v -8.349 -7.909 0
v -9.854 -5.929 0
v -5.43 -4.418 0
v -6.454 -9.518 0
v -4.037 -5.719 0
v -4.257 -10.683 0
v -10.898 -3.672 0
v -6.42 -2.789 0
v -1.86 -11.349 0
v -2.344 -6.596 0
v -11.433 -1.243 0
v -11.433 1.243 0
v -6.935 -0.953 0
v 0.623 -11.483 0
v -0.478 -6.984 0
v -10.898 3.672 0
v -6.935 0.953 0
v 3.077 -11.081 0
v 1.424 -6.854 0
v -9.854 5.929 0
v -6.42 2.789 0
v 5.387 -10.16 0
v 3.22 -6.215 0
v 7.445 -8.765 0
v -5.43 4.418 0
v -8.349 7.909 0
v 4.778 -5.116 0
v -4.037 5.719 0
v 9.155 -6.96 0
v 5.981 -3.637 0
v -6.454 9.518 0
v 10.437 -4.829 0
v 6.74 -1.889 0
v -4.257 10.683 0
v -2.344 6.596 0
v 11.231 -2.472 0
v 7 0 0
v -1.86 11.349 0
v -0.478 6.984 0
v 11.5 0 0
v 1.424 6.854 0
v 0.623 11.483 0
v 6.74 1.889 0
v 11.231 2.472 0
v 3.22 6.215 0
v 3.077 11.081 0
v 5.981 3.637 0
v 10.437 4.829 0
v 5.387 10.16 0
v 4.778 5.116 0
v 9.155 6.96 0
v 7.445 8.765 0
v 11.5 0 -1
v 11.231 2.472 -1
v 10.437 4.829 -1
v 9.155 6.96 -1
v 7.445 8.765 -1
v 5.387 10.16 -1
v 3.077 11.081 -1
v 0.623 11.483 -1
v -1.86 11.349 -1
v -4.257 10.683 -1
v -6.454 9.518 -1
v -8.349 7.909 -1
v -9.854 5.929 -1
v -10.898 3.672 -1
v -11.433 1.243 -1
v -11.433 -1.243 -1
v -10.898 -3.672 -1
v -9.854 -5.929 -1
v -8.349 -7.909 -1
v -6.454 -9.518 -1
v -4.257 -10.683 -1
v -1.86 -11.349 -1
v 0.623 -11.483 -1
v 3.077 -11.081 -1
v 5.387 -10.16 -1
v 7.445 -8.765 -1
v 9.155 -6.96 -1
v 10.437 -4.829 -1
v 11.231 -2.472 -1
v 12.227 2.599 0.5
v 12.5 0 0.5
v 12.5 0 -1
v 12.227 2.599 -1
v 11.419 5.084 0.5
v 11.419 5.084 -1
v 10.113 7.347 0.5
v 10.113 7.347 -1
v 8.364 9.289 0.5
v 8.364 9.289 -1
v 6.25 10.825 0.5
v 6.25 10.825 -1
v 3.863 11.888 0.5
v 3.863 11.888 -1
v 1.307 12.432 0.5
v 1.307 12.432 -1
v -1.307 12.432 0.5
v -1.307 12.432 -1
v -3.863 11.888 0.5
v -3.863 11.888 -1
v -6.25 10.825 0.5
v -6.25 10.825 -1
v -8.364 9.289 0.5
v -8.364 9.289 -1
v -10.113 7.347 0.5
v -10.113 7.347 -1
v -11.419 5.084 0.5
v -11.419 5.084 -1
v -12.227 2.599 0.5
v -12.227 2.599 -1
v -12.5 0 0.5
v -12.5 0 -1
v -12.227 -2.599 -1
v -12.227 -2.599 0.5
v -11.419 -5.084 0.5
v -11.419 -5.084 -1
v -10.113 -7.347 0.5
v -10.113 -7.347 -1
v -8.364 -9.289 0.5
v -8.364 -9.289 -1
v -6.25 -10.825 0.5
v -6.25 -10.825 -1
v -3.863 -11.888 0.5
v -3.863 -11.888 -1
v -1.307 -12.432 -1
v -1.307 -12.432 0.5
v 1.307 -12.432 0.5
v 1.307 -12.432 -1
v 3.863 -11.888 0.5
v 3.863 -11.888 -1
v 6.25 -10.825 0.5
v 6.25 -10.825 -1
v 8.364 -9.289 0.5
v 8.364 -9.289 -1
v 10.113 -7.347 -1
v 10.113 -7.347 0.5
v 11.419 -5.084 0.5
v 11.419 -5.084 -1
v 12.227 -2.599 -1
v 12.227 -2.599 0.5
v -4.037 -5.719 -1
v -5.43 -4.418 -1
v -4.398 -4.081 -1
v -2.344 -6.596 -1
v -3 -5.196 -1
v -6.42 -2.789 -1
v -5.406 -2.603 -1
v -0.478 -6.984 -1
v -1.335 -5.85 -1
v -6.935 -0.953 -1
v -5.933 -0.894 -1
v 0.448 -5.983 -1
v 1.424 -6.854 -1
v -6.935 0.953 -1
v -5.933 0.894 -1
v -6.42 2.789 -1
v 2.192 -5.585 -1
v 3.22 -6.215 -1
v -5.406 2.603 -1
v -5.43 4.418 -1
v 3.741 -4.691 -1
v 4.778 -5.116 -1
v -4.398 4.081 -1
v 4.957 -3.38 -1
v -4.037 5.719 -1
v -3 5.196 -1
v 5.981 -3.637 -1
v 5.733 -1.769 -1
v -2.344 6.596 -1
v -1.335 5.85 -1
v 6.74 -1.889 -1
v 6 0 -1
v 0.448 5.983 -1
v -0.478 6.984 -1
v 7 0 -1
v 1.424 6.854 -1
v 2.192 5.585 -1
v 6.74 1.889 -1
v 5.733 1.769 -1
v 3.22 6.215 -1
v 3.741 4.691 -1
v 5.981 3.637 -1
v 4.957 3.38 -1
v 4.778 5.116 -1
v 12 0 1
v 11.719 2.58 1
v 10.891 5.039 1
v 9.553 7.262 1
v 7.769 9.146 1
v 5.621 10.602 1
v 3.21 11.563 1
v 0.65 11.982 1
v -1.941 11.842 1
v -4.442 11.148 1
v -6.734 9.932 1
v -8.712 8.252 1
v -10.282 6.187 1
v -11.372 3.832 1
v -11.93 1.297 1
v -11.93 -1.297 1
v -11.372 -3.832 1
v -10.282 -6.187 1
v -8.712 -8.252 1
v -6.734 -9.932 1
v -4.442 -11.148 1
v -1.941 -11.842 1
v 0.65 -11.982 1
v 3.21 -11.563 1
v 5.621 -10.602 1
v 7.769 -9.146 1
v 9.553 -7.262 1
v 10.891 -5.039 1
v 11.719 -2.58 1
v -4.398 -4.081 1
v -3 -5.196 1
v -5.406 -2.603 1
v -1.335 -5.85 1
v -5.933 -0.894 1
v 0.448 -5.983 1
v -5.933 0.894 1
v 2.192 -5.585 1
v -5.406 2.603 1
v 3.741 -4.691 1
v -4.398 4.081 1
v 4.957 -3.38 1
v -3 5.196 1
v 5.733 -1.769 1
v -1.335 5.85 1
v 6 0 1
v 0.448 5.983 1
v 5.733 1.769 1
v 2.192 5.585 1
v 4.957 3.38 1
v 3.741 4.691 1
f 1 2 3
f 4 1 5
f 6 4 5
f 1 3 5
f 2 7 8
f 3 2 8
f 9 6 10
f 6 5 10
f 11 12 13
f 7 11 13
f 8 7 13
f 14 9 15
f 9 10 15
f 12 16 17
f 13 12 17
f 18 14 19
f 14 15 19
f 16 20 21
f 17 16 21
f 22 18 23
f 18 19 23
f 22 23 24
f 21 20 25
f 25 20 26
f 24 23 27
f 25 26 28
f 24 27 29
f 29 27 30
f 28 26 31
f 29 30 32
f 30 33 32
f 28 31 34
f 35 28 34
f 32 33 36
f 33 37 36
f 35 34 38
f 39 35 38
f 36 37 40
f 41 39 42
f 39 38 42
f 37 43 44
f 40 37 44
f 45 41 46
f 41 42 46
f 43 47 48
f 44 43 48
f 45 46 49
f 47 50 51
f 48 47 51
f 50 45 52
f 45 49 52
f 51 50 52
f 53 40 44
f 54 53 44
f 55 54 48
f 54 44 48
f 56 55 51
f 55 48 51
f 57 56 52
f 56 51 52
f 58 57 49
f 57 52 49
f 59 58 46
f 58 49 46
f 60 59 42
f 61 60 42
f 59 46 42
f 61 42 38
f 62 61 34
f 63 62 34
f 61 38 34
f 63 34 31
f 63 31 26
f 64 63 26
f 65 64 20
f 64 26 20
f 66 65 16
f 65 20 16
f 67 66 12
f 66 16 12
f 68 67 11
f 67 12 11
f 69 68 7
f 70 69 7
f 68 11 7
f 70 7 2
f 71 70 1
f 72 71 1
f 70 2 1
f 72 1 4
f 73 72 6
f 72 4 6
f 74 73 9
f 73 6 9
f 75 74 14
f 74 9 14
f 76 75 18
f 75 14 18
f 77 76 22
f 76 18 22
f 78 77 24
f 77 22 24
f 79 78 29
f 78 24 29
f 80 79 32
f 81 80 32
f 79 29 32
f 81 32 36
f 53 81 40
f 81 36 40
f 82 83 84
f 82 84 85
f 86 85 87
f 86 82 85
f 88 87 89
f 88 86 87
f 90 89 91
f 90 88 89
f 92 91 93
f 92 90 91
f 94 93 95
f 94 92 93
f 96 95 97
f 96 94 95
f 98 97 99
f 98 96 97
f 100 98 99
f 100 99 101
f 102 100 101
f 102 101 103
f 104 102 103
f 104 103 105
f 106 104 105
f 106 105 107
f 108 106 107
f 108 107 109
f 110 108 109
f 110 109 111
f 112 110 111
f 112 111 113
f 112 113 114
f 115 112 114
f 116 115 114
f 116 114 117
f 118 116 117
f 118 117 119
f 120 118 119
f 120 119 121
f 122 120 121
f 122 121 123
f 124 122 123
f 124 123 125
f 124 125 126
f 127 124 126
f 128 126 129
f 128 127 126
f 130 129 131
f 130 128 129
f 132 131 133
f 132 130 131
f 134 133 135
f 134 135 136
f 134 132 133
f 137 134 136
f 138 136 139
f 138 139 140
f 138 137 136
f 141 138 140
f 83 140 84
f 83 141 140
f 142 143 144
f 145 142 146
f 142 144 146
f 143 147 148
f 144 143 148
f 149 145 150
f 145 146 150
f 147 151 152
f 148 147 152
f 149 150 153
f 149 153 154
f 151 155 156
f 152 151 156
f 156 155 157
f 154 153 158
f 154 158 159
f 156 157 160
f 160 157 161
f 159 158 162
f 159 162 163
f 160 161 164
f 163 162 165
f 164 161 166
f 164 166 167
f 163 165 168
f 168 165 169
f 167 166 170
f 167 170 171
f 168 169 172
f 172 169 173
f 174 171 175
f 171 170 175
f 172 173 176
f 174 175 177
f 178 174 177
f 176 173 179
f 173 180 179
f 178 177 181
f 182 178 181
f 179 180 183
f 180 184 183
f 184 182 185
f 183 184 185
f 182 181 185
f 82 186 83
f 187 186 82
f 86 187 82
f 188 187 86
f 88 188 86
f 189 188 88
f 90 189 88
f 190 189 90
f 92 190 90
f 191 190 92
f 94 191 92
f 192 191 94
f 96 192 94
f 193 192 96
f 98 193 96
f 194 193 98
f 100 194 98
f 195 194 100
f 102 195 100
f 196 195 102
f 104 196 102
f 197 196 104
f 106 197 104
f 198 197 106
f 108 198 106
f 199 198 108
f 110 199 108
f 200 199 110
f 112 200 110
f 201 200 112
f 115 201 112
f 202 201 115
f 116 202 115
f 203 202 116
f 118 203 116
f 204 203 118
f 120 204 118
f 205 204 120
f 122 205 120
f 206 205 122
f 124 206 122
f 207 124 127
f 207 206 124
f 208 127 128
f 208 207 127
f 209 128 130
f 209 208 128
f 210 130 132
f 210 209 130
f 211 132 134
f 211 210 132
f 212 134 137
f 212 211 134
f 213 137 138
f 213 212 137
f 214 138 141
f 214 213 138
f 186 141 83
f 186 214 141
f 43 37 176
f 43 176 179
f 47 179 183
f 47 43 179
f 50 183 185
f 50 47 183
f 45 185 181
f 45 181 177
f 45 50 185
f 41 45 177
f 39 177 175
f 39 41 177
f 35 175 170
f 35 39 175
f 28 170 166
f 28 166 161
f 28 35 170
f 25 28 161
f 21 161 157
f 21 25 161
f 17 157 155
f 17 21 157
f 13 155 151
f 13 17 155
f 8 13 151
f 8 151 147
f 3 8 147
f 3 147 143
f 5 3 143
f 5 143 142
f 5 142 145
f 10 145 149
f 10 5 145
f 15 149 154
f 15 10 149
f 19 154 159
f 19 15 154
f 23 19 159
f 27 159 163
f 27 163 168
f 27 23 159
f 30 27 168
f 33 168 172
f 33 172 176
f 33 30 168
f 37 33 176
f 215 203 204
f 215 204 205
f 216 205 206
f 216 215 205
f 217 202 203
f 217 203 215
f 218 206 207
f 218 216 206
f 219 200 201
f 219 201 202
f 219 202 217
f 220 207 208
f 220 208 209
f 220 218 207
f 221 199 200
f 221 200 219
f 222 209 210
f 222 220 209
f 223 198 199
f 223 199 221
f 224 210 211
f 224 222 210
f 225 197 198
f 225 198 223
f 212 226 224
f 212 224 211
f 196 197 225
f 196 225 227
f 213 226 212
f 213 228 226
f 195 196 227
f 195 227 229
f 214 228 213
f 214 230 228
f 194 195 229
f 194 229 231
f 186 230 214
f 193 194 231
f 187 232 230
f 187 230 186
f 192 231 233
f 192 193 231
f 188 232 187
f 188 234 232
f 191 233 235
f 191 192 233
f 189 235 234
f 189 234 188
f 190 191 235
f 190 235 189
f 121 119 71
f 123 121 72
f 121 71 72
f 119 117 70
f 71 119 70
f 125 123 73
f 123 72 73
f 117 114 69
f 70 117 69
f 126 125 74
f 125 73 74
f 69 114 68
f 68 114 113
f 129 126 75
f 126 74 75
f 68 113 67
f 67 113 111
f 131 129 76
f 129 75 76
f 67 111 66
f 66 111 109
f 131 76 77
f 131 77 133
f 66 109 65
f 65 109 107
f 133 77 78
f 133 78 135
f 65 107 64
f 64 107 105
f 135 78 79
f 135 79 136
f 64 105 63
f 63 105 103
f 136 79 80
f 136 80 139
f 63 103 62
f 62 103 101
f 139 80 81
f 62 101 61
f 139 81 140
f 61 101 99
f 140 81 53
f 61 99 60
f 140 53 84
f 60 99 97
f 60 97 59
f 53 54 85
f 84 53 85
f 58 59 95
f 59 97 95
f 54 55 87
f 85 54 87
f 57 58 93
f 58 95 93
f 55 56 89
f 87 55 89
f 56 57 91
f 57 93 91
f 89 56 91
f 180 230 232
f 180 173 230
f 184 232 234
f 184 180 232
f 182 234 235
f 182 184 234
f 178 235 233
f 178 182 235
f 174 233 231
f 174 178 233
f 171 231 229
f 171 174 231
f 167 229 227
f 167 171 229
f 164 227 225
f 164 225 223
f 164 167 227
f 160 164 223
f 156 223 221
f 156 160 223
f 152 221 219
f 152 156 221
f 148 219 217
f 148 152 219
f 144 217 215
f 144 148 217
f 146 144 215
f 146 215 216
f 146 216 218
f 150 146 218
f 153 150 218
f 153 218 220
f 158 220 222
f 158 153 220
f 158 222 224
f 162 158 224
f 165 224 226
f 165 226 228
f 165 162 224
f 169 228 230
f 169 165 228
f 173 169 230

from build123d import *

# Parameters (mm, degrees)
F0_R     = 12.5
F0_R_2   = 11.5
F0_R_3   = 7
F0_R_4   = 6
F1_DEPTH = 1
F2_DEPTH = 1
F3_SIZE  = 0.5


with BuildPart() as f1:
    # F0 (on Top) → F1 (new body)
    with BuildSketch(Plane.XY):
        Circle(F0_R)
        Circle(F0_R_2, mode=Mode.SUBTRACT)
        Circle(F0_R_2)
        Circle(F0_R_3, mode=Mode.SUBTRACT)
        Circle(F0_R_3)
        Circle(F0_R_4, mode=Mode.SUBTRACT)
    extrude(amount=F1_DEPTH)

    # F0 (on Top) → F2 (join)
    with BuildSketch(Plane.XY):
        Circle(F0_R)
        Circle(F0_R_2, mode=Mode.SUBTRACT)
        Circle(F0_R_3)
        Circle(F0_R_4, mode=Mode.SUBTRACT)
    extrude(amount=-F2_DEPTH)

    # F3
    f3_edges = [f1.edges().sort_by_distance(p)[0] for p in [
        (-12.5, 0, 1),
    ]]
    chamfer(f3_edges, length=F3_SIZE)


solid = f1.part
